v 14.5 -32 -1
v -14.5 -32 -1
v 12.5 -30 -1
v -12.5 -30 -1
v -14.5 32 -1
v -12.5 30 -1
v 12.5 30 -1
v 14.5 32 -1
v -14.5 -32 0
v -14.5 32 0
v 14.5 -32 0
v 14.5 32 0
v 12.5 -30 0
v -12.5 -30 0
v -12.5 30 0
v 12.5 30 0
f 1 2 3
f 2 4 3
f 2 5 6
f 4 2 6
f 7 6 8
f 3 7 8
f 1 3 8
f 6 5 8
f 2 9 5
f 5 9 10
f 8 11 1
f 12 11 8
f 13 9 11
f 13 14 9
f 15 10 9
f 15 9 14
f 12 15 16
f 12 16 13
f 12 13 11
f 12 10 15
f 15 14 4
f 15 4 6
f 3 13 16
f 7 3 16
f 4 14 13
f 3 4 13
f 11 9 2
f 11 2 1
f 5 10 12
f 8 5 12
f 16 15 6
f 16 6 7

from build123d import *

# Parameters (mm, degrees)
SKETCH2_W           = 29
SKETCH2_H           = 64
BOSS_EXTRUDE1_DEPTH = 1
SKETCH3_W           = 25
SKETCH3_H           = 60
CUT_EXTRUDE4_DEPTH  = 1


with BuildPart() as part:
    # Sketch2 → Boss-Extrude1 (new body)
    with BuildSketch(Plane.XY):
        Rectangle(SKETCH2_W, SKETCH2_H)
    extrude(amount=-BOSS_EXTRUDE1_DEPTH)

    # Sketch3 → Cut-Extrude4 (cut)
    with BuildSketch(Plane.XY):
        Rectangle(SKETCH3_W, SKETCH3_H)
    extrude(amount=-CUT_EXTRUDE4_DEPTH, mode=Mode.SUBTRACT)


solid = part.part
